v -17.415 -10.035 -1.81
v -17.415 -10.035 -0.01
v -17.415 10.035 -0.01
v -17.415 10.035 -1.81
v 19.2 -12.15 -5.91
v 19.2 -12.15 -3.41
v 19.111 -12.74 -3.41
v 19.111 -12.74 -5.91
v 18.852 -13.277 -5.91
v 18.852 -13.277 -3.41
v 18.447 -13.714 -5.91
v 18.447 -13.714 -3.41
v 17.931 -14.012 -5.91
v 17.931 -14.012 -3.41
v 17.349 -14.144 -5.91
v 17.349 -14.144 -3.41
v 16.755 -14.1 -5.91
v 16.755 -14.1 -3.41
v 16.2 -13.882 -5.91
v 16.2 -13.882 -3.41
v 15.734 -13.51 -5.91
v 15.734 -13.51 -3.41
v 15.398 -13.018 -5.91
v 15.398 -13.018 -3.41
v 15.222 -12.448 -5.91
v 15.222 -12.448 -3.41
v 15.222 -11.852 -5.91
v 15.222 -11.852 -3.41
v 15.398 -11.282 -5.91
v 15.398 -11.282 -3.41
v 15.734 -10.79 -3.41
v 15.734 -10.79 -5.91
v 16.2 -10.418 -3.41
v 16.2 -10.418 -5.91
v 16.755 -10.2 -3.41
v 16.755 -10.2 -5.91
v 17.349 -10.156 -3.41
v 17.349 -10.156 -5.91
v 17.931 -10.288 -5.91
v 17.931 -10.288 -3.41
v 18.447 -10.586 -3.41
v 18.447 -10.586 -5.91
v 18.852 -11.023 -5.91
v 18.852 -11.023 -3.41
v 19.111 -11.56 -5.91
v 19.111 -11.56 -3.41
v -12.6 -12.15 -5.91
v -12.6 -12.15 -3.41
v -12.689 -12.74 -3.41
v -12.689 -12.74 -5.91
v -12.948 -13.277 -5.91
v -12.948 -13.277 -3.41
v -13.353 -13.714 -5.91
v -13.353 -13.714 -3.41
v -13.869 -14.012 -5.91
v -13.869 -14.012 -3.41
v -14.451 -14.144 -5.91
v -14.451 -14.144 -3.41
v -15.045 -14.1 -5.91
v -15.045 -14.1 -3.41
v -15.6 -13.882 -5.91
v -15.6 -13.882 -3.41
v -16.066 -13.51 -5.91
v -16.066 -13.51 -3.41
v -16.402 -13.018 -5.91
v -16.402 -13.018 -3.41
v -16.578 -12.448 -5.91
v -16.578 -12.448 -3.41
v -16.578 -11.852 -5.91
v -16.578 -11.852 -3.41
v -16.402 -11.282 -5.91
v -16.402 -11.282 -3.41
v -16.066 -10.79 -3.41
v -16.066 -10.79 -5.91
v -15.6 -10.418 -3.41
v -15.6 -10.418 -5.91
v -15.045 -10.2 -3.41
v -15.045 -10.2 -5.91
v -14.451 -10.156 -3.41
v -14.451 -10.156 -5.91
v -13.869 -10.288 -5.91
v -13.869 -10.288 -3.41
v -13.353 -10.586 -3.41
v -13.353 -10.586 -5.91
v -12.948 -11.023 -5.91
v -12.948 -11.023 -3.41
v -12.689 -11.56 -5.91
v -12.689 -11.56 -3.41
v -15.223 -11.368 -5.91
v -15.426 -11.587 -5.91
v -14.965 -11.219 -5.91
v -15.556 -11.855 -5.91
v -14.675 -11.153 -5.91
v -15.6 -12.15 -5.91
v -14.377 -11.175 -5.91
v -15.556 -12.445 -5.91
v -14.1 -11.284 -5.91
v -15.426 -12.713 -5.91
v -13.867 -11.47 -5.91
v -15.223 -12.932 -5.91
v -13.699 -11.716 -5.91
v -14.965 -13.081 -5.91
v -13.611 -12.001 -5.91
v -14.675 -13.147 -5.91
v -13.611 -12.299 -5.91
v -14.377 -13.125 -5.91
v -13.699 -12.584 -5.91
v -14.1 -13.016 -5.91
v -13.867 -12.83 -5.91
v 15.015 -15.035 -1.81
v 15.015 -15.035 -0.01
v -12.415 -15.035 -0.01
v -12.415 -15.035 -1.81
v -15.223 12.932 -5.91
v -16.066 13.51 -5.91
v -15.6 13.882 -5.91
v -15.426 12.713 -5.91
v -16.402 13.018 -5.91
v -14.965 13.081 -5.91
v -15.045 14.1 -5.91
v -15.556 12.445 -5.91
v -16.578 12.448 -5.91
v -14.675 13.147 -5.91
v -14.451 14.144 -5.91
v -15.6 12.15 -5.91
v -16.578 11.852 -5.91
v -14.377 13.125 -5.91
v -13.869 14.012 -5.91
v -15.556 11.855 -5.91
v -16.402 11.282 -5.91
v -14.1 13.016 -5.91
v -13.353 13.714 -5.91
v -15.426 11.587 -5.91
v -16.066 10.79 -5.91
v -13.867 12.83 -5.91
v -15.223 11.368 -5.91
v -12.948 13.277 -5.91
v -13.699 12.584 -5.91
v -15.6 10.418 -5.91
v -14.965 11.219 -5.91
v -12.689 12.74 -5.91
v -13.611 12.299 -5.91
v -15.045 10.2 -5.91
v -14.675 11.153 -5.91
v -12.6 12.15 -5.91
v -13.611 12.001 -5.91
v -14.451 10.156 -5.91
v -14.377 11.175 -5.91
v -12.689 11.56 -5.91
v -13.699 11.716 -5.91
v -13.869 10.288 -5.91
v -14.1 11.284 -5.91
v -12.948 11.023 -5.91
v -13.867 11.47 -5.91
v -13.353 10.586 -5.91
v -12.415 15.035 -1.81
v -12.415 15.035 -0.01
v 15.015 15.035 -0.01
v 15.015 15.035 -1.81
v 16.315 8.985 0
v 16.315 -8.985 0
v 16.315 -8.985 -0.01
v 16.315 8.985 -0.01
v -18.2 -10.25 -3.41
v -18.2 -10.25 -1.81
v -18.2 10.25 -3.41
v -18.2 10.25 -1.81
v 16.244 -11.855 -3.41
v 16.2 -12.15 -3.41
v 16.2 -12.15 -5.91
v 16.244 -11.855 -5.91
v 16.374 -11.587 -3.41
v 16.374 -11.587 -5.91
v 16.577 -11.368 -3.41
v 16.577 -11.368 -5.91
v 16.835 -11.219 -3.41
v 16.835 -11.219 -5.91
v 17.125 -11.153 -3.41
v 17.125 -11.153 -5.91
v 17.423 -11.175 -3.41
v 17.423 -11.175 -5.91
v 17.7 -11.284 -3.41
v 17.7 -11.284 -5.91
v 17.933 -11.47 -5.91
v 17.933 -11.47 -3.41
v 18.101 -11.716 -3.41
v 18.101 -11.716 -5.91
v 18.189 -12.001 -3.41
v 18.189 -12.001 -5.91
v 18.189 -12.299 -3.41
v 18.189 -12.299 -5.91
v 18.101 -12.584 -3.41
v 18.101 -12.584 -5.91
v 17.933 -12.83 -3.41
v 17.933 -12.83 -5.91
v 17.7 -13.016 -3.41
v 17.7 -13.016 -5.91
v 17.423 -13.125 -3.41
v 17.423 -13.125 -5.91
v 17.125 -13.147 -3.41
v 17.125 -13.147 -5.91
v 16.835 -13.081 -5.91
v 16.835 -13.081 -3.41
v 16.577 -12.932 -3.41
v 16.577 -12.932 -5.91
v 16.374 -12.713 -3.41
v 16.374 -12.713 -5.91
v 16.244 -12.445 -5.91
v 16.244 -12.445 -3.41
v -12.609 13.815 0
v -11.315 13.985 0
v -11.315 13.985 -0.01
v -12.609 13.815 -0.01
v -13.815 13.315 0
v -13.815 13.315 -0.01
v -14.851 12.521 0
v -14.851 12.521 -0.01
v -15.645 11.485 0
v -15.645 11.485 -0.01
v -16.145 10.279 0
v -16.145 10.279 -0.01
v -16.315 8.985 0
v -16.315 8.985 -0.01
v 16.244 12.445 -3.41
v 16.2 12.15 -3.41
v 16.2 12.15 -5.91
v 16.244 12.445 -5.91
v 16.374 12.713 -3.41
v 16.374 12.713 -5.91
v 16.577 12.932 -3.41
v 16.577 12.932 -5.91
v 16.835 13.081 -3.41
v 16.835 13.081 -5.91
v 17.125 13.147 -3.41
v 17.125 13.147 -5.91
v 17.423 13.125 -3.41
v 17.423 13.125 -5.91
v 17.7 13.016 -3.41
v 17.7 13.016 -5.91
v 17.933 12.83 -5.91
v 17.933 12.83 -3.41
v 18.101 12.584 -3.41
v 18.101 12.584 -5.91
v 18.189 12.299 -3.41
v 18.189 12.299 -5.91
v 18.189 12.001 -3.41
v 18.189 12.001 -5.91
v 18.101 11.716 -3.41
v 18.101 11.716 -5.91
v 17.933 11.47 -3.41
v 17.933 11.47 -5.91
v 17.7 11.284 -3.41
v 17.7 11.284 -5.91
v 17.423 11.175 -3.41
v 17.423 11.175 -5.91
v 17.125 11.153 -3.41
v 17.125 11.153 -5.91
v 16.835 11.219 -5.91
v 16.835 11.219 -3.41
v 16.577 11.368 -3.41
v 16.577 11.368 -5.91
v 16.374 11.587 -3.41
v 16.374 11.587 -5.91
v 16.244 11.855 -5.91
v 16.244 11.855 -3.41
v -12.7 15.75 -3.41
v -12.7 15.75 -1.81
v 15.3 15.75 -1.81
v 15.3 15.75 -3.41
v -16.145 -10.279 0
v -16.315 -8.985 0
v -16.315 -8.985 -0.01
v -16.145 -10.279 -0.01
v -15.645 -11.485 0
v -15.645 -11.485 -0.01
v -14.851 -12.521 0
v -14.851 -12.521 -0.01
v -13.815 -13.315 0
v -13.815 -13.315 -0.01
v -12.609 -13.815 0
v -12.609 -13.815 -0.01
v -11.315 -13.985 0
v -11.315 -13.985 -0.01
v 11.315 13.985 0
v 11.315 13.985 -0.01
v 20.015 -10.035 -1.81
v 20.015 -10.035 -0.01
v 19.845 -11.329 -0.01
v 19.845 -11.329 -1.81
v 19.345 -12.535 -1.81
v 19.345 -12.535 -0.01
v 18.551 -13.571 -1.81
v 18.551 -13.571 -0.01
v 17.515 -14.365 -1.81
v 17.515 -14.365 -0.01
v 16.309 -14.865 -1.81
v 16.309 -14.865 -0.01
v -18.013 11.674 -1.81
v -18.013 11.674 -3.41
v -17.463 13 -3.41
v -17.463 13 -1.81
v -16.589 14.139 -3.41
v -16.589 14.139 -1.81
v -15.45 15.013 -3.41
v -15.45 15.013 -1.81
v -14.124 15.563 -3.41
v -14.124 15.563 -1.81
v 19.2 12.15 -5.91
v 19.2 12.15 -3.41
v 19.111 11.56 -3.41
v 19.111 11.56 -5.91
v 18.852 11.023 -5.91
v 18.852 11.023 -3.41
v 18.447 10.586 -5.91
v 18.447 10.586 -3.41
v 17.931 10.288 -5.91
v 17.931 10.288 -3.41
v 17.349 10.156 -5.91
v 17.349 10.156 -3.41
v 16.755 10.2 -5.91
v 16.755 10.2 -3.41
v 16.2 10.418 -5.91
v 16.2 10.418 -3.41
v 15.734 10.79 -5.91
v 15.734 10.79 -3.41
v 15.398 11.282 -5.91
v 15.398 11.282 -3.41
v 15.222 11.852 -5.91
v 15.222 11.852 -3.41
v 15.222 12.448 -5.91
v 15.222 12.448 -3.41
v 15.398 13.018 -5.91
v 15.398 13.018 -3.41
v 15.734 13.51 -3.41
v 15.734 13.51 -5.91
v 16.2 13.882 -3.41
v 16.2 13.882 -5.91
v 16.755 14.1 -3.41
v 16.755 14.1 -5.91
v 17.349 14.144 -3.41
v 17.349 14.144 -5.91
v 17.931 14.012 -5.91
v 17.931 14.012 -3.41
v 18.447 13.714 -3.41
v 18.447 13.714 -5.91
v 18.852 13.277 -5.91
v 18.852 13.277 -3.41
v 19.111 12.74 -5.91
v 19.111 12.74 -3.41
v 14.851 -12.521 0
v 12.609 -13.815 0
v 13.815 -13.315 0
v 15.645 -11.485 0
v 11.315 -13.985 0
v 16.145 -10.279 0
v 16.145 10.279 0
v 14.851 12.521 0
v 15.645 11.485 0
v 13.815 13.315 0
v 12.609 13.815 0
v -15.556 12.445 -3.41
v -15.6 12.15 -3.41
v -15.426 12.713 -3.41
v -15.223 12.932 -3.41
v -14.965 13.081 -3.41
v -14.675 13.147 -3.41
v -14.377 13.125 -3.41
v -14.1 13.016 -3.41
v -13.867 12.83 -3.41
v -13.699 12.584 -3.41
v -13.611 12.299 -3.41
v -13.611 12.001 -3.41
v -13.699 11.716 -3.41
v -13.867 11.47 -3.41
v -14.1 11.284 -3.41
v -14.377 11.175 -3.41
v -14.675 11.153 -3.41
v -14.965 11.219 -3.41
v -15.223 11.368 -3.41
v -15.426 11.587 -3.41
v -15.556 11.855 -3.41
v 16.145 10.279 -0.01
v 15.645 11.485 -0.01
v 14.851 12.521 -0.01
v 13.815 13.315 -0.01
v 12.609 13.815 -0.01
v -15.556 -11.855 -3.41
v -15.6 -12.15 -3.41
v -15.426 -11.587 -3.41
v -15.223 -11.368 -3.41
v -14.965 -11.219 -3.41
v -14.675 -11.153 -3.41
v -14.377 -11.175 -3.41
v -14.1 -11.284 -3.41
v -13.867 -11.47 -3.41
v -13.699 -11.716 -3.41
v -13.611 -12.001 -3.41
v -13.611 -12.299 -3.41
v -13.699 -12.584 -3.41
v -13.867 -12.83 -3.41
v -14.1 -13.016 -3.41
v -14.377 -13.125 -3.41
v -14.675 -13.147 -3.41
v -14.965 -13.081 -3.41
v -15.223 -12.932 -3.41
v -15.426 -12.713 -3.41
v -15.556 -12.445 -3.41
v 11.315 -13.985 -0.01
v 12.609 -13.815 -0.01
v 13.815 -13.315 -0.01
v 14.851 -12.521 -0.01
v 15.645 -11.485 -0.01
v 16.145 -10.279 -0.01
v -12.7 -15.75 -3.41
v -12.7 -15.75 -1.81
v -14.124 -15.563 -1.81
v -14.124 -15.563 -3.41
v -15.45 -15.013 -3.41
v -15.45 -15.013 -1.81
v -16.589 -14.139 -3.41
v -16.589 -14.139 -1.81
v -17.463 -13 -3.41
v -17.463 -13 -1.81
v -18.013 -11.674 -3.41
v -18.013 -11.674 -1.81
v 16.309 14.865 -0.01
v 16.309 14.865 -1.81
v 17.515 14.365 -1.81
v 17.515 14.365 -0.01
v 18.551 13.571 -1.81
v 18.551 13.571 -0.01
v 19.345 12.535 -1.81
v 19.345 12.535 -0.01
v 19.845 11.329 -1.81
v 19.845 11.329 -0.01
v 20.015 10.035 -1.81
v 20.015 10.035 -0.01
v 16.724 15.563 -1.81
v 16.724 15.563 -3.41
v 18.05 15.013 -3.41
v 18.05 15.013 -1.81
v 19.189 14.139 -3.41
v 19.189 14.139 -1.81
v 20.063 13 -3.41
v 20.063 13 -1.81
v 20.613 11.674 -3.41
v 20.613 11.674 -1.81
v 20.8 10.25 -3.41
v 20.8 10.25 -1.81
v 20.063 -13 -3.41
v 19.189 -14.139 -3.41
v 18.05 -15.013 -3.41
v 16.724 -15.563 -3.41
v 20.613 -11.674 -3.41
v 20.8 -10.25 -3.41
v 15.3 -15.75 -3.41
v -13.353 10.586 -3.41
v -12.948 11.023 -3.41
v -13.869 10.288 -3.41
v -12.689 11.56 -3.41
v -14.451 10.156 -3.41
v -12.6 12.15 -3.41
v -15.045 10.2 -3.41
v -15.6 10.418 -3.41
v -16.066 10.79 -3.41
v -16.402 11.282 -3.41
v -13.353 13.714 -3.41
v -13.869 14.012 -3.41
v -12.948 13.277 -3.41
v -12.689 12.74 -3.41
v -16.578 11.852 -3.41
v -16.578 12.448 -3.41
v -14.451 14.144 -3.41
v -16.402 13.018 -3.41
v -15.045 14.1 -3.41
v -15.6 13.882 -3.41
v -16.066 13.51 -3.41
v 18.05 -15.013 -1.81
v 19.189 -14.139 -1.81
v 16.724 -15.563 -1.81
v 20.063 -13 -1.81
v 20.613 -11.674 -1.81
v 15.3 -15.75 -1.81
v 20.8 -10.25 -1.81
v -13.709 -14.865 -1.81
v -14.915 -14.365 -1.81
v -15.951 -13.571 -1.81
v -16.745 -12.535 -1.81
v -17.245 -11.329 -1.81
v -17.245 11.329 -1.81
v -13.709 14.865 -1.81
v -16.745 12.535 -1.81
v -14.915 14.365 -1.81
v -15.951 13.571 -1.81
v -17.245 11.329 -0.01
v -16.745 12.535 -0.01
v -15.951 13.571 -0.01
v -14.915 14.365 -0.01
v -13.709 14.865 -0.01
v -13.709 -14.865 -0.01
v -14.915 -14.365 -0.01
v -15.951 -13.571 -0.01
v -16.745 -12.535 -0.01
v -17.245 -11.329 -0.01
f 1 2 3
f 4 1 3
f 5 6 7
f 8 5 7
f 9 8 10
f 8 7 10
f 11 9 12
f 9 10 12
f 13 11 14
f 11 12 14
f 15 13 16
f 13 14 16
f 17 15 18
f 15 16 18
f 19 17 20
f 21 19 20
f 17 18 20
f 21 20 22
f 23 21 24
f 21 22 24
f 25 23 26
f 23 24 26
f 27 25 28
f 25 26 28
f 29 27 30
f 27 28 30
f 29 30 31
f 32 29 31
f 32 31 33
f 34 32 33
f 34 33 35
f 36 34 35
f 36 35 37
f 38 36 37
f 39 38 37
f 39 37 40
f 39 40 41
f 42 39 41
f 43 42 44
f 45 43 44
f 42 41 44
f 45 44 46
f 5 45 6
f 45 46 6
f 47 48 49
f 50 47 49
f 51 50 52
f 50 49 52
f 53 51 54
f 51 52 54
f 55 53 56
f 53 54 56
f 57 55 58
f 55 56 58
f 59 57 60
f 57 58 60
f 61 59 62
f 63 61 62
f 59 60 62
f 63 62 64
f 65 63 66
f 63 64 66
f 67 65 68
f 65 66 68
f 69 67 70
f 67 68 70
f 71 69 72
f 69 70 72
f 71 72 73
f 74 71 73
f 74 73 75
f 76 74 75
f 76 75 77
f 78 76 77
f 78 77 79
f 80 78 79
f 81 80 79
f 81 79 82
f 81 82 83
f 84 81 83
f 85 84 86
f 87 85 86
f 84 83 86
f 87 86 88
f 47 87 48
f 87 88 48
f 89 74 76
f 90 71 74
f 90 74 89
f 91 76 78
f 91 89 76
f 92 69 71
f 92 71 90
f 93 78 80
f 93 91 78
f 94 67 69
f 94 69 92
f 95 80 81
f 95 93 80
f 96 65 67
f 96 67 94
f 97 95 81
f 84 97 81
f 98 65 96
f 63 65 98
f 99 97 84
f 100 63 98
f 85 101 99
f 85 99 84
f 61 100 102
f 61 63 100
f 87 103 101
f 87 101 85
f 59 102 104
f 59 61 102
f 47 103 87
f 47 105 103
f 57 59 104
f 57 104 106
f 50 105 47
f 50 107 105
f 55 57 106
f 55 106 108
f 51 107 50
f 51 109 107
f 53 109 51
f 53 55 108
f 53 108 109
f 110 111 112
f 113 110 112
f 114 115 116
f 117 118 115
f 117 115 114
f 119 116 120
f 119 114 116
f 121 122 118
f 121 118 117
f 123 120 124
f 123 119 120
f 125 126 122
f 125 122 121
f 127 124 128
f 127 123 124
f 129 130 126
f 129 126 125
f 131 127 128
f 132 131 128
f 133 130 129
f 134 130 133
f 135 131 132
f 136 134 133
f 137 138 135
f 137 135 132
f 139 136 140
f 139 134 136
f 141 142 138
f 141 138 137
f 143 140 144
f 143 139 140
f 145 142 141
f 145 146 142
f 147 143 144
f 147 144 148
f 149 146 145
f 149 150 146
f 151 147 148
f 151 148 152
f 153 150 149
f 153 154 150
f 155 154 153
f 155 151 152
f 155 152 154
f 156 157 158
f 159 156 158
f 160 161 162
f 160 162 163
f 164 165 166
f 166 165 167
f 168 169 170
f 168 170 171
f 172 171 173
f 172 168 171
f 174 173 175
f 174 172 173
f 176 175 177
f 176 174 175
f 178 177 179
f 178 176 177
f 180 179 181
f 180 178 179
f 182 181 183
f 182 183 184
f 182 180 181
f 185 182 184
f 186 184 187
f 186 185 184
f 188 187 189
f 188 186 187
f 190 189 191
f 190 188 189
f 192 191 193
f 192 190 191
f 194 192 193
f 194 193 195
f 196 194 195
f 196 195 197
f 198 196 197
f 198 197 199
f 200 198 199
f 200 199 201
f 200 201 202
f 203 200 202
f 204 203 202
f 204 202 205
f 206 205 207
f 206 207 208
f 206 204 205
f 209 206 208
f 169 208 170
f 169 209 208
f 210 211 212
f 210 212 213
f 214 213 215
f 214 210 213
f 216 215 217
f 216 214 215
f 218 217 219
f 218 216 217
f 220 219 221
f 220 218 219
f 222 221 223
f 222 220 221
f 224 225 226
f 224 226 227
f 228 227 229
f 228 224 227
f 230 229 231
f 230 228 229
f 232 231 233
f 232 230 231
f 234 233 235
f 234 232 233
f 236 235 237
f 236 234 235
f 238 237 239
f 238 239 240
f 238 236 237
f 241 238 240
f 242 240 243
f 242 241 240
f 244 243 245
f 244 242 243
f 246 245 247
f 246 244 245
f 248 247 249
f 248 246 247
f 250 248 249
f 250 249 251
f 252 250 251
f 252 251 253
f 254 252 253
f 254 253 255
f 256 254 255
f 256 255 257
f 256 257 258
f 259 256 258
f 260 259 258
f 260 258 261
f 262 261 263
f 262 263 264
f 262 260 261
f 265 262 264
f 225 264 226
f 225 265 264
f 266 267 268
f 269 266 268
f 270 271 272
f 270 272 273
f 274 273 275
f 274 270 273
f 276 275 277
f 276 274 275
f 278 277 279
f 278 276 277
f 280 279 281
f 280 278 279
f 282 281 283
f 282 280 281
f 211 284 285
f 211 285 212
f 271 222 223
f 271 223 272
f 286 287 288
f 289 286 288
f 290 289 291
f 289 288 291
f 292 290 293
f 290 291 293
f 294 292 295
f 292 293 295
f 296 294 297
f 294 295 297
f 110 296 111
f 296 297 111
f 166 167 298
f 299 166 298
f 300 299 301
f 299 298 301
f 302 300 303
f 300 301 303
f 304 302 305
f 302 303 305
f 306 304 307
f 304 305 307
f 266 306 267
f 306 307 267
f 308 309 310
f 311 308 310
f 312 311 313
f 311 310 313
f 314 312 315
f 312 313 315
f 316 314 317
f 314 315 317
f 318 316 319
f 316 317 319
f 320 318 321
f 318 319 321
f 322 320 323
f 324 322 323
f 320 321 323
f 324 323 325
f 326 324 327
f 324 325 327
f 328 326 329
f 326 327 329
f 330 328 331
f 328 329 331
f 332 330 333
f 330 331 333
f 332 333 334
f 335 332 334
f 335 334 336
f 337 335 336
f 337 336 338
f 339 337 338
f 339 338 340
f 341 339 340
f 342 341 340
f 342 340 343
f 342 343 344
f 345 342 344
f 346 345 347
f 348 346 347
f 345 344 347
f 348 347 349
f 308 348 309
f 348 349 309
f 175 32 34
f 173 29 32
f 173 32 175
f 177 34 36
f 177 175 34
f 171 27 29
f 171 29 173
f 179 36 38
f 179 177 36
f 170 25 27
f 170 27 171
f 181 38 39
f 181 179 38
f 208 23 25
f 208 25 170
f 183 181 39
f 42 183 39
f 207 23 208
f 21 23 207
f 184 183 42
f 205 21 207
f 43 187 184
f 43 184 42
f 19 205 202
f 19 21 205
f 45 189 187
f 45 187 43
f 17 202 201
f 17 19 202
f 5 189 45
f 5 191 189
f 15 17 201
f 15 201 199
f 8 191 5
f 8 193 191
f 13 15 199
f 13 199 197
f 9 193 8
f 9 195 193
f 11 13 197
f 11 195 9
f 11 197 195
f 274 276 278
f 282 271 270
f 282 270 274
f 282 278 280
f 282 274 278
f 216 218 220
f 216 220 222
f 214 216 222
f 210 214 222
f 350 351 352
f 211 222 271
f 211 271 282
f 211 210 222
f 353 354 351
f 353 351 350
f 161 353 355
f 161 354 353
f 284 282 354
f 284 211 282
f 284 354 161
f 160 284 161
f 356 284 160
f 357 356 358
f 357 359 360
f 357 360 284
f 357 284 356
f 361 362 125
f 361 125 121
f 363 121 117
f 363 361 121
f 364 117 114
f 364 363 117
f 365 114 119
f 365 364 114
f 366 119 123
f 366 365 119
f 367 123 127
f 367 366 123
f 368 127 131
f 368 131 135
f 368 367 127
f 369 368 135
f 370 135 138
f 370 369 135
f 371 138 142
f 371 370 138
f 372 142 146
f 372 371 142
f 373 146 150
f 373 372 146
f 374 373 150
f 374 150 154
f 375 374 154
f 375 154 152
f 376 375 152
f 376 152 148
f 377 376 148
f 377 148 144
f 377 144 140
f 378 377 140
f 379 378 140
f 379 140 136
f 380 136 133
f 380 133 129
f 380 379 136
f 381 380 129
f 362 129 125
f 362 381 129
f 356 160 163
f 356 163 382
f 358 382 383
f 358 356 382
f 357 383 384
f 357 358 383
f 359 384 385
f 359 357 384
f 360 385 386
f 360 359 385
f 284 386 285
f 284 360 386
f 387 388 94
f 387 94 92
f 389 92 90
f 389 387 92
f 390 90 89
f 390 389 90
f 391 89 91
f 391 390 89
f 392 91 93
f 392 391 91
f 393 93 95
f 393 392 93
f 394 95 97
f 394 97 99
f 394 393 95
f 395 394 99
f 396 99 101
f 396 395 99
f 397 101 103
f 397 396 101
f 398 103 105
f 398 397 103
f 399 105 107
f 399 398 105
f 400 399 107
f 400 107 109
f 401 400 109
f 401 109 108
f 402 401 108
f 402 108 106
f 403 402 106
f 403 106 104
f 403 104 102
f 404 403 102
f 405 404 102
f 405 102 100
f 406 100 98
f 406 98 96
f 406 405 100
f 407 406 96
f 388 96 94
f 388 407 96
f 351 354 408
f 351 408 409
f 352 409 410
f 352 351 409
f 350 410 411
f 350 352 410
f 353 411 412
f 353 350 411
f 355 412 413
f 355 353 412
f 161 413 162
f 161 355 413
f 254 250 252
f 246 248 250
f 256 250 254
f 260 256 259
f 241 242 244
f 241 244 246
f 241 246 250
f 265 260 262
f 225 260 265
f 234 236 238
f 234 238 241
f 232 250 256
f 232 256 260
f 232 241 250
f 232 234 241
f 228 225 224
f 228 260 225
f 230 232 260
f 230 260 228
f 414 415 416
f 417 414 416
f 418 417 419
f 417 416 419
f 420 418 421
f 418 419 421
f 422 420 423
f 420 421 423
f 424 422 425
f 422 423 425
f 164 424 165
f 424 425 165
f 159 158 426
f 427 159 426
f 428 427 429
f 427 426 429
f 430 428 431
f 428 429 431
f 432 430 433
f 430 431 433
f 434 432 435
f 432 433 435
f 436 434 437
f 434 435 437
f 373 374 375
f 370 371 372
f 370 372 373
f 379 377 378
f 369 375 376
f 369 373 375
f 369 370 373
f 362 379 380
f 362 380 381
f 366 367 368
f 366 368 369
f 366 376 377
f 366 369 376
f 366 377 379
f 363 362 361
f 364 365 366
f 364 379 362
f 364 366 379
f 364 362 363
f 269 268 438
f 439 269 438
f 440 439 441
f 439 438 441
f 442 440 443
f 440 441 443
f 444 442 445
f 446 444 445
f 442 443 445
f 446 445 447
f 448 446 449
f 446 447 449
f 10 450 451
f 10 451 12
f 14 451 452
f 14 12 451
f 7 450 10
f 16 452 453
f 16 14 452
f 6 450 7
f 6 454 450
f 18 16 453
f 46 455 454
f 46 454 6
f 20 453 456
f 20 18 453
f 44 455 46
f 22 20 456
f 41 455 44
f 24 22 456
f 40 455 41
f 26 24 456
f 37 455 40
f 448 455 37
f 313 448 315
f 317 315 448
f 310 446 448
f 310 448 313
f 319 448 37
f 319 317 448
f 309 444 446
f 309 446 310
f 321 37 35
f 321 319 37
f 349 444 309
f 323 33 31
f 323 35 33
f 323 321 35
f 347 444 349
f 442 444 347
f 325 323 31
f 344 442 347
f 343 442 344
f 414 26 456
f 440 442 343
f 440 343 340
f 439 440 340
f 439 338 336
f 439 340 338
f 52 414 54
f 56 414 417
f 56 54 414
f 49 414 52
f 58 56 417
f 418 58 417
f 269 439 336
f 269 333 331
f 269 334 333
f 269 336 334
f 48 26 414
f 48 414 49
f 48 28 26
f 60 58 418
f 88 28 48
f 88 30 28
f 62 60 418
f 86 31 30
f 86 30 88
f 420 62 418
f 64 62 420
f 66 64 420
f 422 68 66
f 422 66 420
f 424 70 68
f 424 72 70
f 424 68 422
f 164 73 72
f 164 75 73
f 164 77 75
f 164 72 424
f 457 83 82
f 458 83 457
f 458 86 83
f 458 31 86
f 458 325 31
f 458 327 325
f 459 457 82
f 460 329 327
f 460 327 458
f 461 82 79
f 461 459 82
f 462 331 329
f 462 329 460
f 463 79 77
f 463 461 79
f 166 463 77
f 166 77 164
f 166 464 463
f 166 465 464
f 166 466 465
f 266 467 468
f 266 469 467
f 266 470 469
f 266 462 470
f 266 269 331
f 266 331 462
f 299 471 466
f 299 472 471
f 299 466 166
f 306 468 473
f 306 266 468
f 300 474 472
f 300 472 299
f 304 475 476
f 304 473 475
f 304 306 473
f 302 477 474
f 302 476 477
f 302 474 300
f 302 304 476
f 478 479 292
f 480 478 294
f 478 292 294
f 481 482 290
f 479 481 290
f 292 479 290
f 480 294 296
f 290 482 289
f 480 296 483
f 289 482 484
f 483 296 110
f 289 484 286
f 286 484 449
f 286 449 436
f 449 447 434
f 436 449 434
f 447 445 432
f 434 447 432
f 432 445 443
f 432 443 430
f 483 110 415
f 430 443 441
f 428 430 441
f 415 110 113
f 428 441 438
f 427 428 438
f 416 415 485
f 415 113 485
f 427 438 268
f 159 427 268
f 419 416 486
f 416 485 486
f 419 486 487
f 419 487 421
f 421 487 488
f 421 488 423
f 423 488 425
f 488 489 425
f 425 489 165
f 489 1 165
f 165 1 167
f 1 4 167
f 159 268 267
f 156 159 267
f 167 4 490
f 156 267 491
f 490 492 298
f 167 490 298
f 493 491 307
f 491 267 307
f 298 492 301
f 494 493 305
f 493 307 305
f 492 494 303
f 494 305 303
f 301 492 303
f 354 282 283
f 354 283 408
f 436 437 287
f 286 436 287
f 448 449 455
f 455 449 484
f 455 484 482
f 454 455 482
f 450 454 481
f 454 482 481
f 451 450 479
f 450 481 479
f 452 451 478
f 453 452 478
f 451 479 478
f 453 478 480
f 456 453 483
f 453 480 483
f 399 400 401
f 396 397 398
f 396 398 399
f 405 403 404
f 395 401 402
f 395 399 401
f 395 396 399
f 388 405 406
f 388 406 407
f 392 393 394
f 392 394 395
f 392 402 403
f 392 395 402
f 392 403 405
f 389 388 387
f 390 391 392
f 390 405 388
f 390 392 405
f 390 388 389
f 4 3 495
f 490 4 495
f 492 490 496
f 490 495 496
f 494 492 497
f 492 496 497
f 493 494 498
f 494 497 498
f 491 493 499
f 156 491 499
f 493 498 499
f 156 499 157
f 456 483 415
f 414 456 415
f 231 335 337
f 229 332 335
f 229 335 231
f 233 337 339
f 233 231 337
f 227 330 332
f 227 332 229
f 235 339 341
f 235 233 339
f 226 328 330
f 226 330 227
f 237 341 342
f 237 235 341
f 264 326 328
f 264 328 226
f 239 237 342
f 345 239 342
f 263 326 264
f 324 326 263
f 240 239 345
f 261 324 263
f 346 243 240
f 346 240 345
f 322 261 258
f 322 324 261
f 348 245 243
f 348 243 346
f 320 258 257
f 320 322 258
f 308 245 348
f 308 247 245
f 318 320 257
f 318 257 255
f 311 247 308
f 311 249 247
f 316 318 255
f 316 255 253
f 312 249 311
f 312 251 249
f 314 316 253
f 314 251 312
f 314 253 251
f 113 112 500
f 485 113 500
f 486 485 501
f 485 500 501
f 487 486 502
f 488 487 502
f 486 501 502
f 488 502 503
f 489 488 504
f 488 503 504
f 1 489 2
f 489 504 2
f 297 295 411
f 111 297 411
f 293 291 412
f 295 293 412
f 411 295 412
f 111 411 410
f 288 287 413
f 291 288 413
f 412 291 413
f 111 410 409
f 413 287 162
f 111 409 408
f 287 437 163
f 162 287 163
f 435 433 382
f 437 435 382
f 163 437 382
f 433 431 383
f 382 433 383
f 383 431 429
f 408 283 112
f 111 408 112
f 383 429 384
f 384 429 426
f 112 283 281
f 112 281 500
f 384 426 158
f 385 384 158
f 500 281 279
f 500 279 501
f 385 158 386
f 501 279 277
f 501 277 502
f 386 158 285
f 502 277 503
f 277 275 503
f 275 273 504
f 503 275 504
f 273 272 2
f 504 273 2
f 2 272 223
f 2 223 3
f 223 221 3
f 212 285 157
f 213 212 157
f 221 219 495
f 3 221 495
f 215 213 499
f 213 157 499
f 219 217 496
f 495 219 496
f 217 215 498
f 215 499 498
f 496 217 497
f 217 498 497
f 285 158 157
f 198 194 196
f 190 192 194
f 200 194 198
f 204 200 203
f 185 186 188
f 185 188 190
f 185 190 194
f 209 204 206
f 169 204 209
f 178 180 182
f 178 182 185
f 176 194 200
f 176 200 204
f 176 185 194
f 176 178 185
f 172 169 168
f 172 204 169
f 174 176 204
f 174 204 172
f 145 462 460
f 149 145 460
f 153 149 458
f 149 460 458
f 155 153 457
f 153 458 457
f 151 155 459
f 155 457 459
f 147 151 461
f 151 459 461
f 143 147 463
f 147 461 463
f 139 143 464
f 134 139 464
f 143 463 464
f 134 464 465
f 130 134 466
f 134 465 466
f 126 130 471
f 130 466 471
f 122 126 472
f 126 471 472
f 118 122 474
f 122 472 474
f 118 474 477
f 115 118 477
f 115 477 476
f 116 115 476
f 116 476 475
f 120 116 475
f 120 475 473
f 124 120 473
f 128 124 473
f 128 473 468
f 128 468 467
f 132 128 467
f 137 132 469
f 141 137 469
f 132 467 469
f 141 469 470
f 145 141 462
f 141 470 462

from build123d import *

# Parameters (mm, degrees)
BOSS_EXTRU_1_DEPTH = 0.01
BOSS_EXTRU_2_DEPTH = 1.8
BOSS_EXTRU_3_DEPTH = 1.6
ESQUISSE4_R        = 2
ESQUISSE4_R_2      = 1
BOSS_EXTRU_4_DEPTH = 2.5


with BuildPart() as part:
    # Esquisse1 → Boss.-Extru.1 (new body)
    with BuildSketch(Plane.XY):
        with BuildLine():
            Line((-11.315, -13.985), (11.315, -13.985))
            ThreePointArc((11.315, -13.985), (14.850533906, -12.520533906), (16.315, -8.985))
            Line((16.315, -8.985), (16.315, 8.985))
            ThreePointArc((16.315, 8.985), (14.850533906, 12.520533906), (11.315, 13.985))
            Line((11.315, 13.985), (-11.315, 13.985))
            ThreePointArc((-11.315, 13.985), (-14.850533906, 12.520533906), (-16.315, 8.985))
            Line((-16.315, 8.985), (-16.315, -8.985))
            ThreePointArc((-16.315, -8.985), (-14.850533906, -12.520533906), (-11.315, -13.985))
        make_face()
    extrude(amount=-BOSS_EXTRU_1_DEPTH)

    # Esquisse2 → Boss.-Extru.2 (add)
    with BuildSketch(Plane(origin=(0, 0, -0.01), x_dir=(-1, 0, 0), z_dir=(0, 0, -1))):
        with BuildLine():
            Line((-15.015, -15.035), (12.415, -15.035))
            ThreePointArc((12.415, -15.035), (15.950533906, -13.570533906), (17.415, -10.035))
            Line((17.415, -10.035), (17.415, 10.035))
            ThreePointArc((17.415, 10.035), (15.950533906, 13.570533906), (12.415, 15.035))
            Line((12.415, 15.035), (-15.015, 15.035))
            ThreePointArc((-15.015, 15.035), (-18.550533906, 13.570533906), (-20.015, 10.035))
            Line((-20.015, 10.035), (-20.015, -10.035))
            ThreePointArc((-20.015, -10.035), (-18.550533906, -13.570533906), (-15.015, -15.035))
        make_face()
    extrude(amount=BOSS_EXTRU_2_DEPTH)

    # Esquisse3 → Boss.-Extru.3 (add)
    with BuildSketch(Plane(origin=(0, 0, -1.81), x_dir=(-1, 0, 0), z_dir=(0, 0, -1))):
        with BuildLine():
            Line((-15.3, -15.75), (12.7, -15.75))
            ThreePointArc((12.7, -15.75), (16.589087297, -14.139087297), (18.2, -10.25))
            Line((18.2, -10.25), (18.2, 10.25))
            ThreePointArc((18.2, 10.25), (16.589087297, 14.139087297), (12.7, 15.75))
            Line((12.7, 15.75), (-15.3, 15.75))
            ThreePointArc((-15.3, 15.75), (-19.189087297, 14.139087297), (-20.8, 10.25))
            Line((-20.8, 10.25), (-20.8, -10.25))
            ThreePointArc((-20.8, -10.25), (-19.189087297, -14.139087297), (-15.3, -15.75))
        make_face()
    extrude(amount=BOSS_EXTRU_3_DEPTH)

    # Esquisse4 → Boss.-Extru.4 (add)
    # profile 1 of 4: a face of its own
    with BuildSketch(Plane(origin=(0, 0, -3.41), x_dir=(-1, 0, 0), z_dir=(0, 0, -1))):
        with Locations(Location((-17.2, -12.15, 0), (0, 0, 180))):
            Circle(ESQUISSE4_R)
        with Locations((-17.2, -12.15)):
            Circle(ESQUISSE4_R_2, mode=Mode.SUBTRACT)
    # profile 2 of 4: a face of its own
    with BuildSketch(Plane(origin=(0, 0, -3.41), x_dir=(-1, 0, 0), z_dir=(0, 0, -1))):
        with Locations(Location((14.6, -12.15, 0), (0, 0, 180))):
            Circle(ESQUISSE4_R)
        with Locations((14.6, -12.15)):
            Circle(ESQUISSE4_R_2, mode=Mode.SUBTRACT)
    # profile 3 of 4: a face of its own
    with BuildSketch(Plane(origin=(0, 0, -3.41), x_dir=(-1, 0, 0), z_dir=(0, 0, -1))):
        with Locations(Location((-17.2, 12.15, 0), (0, 0, 180))):
            Circle(ESQUISSE4_R)
        with Locations((-17.2, 12.15)):
            Circle(ESQUISSE4_R_2, mode=Mode.SUBTRACT)
    # profile 4 of 4: a face of its own
    with BuildSketch(Plane(origin=(0, 0, -3.41), x_dir=(-1, 0, 0), z_dir=(0, 0, -1))):
        with Locations(Location((14.6, 12.15, 0), (0, 0, 180))):
            Circle(ESQUISSE4_R)
        with Locations((14.6, 12.15)):
            Circle(ESQUISSE4_R_2, mode=Mode.SUBTRACT)
    extrude(amount=BOSS_EXTRU_4_DEPTH)


solid = part.part
